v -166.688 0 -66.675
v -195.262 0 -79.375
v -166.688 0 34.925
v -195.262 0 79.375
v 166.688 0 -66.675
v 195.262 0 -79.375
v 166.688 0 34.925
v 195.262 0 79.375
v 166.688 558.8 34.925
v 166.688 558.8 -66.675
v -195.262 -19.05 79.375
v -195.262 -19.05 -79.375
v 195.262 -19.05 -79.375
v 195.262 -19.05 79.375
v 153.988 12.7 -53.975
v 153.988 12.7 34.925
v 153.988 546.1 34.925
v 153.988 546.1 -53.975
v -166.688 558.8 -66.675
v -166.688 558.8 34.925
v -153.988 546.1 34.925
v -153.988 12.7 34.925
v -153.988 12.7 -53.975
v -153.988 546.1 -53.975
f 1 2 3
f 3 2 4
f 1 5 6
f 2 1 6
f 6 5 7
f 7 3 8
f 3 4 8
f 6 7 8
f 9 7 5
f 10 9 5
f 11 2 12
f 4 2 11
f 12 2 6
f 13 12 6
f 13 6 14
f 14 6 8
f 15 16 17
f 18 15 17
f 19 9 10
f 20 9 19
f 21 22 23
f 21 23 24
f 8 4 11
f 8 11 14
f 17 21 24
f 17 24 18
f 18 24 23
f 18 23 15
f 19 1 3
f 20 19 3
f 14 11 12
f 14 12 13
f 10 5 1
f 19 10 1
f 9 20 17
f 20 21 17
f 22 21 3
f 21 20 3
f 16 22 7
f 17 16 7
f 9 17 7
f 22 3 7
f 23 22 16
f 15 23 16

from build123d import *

# Parameters (mm, degrees)
F0_W     = 390.525
F0_H     = 158.75
F1_DEPTH = 19.05
F3_DEPTH = 558.8
F4_W     = 307.975
F4_H     = 533.4
F5_DEPTH = 88.9


with BuildPart() as f1:
    # F0 (on Front) → F1 (new body)
    with BuildSketch(Plane.XZ):
        Rectangle(F0_W, F0_H)
    extrude(amount=F1_DEPTH)

    # F2 (on face) → F3 (join)
    with BuildSketch(Plane(origin=(0, 0, 0), x_dir=(-1, 0, 0), z_dir=(0, 1, 0))):
        Polygon((-166.6875, -66.675), (0, -66.675), (166.6875, -66.675), (166.6875, 34.925), (-166.6875, 34.925), align=None)
    extrude(amount=F3_DEPTH)

    # F4 (on face) → F5 (cut)
    with BuildSketch(Plane.XY.offset(34.925)):
        with Locations((0, 279.4)):
            Rectangle(F4_W, F4_H)
    extrude(amount=-F5_DEPTH, mode=Mode.SUBTRACT)


solid = f1.part
